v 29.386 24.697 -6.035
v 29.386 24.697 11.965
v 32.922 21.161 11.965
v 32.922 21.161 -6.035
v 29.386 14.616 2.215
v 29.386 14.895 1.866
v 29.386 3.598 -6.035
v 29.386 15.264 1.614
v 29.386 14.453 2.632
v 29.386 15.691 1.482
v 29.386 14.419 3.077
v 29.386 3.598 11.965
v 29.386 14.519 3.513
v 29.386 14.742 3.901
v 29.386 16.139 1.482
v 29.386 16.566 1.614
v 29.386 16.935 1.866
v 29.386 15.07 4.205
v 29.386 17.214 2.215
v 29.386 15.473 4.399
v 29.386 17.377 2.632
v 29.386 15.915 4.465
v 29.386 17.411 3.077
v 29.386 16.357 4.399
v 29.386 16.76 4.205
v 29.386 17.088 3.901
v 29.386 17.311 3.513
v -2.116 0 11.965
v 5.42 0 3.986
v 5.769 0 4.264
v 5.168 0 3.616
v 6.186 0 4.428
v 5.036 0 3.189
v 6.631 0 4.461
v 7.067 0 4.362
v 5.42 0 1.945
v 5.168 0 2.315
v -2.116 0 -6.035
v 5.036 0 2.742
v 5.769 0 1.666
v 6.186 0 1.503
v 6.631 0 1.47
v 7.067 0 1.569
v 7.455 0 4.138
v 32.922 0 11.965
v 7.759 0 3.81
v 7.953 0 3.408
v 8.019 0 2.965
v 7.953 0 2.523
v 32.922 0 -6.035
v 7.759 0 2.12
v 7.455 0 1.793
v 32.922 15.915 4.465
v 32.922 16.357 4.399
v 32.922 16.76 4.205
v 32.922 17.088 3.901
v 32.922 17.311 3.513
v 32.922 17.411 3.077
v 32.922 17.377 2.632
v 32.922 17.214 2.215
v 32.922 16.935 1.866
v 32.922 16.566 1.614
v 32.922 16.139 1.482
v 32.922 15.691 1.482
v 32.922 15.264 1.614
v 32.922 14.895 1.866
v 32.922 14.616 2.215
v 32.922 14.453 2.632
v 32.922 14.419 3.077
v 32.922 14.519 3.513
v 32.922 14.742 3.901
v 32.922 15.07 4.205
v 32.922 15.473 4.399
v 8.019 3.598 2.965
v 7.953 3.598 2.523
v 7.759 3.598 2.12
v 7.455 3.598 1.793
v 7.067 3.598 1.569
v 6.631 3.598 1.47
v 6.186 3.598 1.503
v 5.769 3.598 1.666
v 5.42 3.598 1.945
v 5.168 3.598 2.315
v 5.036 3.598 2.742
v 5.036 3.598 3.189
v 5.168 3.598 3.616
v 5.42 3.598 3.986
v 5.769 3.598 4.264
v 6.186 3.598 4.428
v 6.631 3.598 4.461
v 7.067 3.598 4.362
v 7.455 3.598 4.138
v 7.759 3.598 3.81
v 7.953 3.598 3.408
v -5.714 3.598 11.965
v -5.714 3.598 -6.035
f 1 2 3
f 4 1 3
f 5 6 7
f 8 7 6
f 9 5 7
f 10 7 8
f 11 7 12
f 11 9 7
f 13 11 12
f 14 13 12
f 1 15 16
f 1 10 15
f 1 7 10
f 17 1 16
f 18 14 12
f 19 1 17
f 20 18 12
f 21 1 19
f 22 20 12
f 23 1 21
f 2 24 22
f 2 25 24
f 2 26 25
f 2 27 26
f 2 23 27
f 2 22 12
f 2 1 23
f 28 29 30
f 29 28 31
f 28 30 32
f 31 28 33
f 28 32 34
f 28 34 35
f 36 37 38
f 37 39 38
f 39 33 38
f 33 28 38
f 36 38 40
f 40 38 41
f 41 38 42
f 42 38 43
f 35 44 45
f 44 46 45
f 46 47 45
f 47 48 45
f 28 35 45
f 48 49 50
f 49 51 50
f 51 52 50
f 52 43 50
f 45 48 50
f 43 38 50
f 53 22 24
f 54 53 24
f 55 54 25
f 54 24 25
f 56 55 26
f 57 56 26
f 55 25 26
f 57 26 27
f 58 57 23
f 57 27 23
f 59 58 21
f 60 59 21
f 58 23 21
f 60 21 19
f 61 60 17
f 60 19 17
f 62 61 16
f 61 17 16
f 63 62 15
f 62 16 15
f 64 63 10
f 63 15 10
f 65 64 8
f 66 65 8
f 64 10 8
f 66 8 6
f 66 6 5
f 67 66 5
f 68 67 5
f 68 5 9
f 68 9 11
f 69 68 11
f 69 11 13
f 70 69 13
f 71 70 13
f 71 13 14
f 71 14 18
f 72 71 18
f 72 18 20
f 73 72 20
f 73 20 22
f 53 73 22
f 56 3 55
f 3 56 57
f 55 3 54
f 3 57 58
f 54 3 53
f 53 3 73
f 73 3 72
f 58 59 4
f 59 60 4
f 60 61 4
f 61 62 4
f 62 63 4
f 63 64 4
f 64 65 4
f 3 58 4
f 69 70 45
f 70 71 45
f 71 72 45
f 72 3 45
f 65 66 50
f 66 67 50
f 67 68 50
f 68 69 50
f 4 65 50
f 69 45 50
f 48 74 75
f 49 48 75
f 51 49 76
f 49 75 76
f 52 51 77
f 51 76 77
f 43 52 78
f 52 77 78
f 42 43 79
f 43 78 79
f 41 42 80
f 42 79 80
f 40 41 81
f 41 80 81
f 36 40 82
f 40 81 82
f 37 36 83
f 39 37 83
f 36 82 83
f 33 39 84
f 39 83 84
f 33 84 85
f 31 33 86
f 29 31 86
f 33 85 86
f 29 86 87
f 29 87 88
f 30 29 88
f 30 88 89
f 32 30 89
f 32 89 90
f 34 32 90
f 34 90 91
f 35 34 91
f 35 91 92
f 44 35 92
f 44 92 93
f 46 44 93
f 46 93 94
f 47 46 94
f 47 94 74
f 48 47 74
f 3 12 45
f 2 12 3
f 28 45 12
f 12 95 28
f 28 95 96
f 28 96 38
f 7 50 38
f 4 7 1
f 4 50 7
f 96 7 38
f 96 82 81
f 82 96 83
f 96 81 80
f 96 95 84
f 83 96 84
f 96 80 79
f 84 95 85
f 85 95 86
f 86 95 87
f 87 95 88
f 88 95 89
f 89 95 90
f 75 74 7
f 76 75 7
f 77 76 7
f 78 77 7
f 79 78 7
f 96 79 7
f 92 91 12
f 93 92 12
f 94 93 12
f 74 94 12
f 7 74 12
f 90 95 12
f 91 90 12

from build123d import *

# Parameters (mm, degrees)
IZIM1_W                     = 60
IZIM1_H                     = 30
Y_KSEKLIK_EKSTR_ZYON1_DEPTH = 30
KES_EKSTR_ZYON1_DEPTH       = 30
IZIM3_W                     = 60.882003546
IZIM3_H                     = 31.045979635
KES_EKSTR_ZYON2_DEPTH       = 68
IZIM5_R                     = 1.5
KES_EKSTR_ZYON3_DEPTH       = 68
KES_EKSTR_ZYON6_DEPTH       = 68
KES_EKSTR_ZYON6_DEPTH_BACK  = 68
IZIM6_W                     = 6
IZIM6_H                     = 30
IZIM7_R                     = 1.5
KES_EKSTR_ZYON7_DEPTH       = 68
IZIM8_W                     = 21.364552878
IZIM8_H                     = 18
KES_EKSTR_ZYON8_DEPTH       = 68
KES_EKSTR_ZYON9_DEPTH       = 68
KES_EKSTR_ZYON10_DEPTH      = 68
KES_EKSTR_ZYON11_DEPTH      = 68
KES_EKSTR_ZYON12_DEPTH      = 68


with BuildPart() as part:
    # Çizim1 → Yükseklik-Ekstrüzyon1 (new body)
    with BuildSketch(Plane(origin=(0, 0, 0), x_dir=(1, 0, 0), z_dir=(0, 1, 0))):
        with Locations((2.921722845, -2.96539542)):
            Rectangle(IZIM1_W, IZIM1_H)
    extrude(amount=Y_KSEKLIK_EKSTR_ZYON1_DEPTH)

    # Çizim2 → Kes-Ekstrüzyon1 (cut)
    with BuildSketch(Plane.XY.offset(17.96539542)):
        Polygon((-27.078277155, 0), (32.921722845, 30), (-27.078277155, 30), align=None)
    extrude(amount=-KES_EKSTR_ZYON1_DEPTH, mode=Mode.SUBTRACT)

    # Çizim3 → Kes-Ekstrüzyon2 (cut)
    with BuildSketch(Plane.XY.offset(17.96539542)):
        with Locations((-1.054812834, 19.120649243)):
            Rectangle(IZIM3_W, IZIM3_H)
    extrude(amount=-KES_EKSTR_ZYON2_DEPTH, mode=Mode.SUBTRACT)

    # Çizim5 → Kes-Ekstrüzyon3 (cut)
    with BuildSketch(Plane.ZY.offset(-29.386188939)):
        with Locations((2.96539542, 15.914946236)):
            Circle(IZIM5_R)
    extrude(amount=-KES_EKSTR_ZYON3_DEPTH, mode=Mode.SUBTRACT)

    # Çizim6 → Kes-Ekstrüzyon6 (cut, two sides: drawn at the far end of the back side and taken through both)
    with BuildSketch(Plane.ZY.offset(-29.386188939).offset(-KES_EKSTR_ZYON6_DEPTH_BACK)):
        with Locations((-9.03460458, 15)):
            Rectangle(IZIM6_W, IZIM6_H)
        with Locations((14.96539542, 15)):
            Rectangle(IZIM6_W, IZIM6_H)
    extrude(amount=KES_EKSTR_ZYON6_DEPTH + KES_EKSTR_ZYON6_DEPTH_BACK, mode=Mode.SUBTRACT)

    # Çizim7 → Kes-Ekstrüzyon7 (cut)
    with BuildSketch(Plane(origin=(0, 3.597659425, 0), x_dir=(1, 0, 0), z_dir=(0, 1, 0))):
        with Locations((6.51938227, -2.96539542)):
            Circle(IZIM7_R)
    extrude(amount=-KES_EKSTR_ZYON7_DEPTH, mode=Mode.SUBTRACT)

    # Çizim8 → Kes-Ekstrüzyon8 (cut)
    with BuildSketch(Plane(origin=(0, 3.597659425, 0), x_dir=(1, 0, 0), z_dir=(0, 1, 0))):
        with Locations((-16.396000716, -2.96539542)):
            Rectangle(IZIM8_W, IZIM8_H)
    extrude(amount=-KES_EKSTR_ZYON8_DEPTH, mode=Mode.SUBTRACT)

    # Çizim9 → Kes-Ekstrüzyon9 (cut)
    with BuildSketch(Plane.XY.offset(11.96539542)):
        Polygon((-5.713724277, 3.597659425), (-2.116064853, 0), (-5.713724277, 0), align=None)
    extrude(amount=-KES_EKSTR_ZYON9_DEPTH, mode=Mode.SUBTRACT)

    # Çizim10 → Kes-Ekstrüzyon10 (cut)
    with BuildSketch(Plane.XY.offset(11.96539542)):
        Polygon((29.386188939, 28.232233047), (32.921722845, 24.696699141), (29.386188939, 24.696699141), align=None)
    extrude(amount=-KES_EKSTR_ZYON10_DEPTH, mode=Mode.SUBTRACT)


with BuildPart() as kes_ekstr_zyon10_piece_1:
    # of the separate pieces the step leaves, piece 1, a body of its own (kes_ekstr_zyon10_pieces)
    add(part.part.solids().sort_by_distance((32.921722845, 0, -6.03460458))[0])

    # Çizim12 → Kes-Ekstrüzyon12 (cut)
    with BuildSketch(Plane.XY.offset(11.96539542)):
        Polygon((29.386188939, 24.696699141), (32.921722845, 21.161165235), (32.921722845, 24.696699141), align=None)
    extrude(amount=-KES_EKSTR_ZYON12_DEPTH, mode=Mode.SUBTRACT)


with BuildPart() as kes_ekstr_zyon10_piece_2:
    # of the separate pieces the step leaves, piece 2, a body of its own (kes_ekstr_zyon10_pieces)
    add(part.part.solids().sort_by_distance((32.921722845, 30, 11.96539542))[0])

    # Çizim11 → Kes-Ekstrüzyon11 (cut)
    with BuildSketch(Plane.XY.offset(11.96539542)):
        Polygon((29.386188939, 28.232233047), (32.921722845, 30), (32.921722845, 24.696699141), align=None)
    extrude(amount=-KES_EKSTR_ZYON11_DEPTH, mode=Mode.SUBTRACT)


solid = kes_ekstr_zyon10_piece_1.part
